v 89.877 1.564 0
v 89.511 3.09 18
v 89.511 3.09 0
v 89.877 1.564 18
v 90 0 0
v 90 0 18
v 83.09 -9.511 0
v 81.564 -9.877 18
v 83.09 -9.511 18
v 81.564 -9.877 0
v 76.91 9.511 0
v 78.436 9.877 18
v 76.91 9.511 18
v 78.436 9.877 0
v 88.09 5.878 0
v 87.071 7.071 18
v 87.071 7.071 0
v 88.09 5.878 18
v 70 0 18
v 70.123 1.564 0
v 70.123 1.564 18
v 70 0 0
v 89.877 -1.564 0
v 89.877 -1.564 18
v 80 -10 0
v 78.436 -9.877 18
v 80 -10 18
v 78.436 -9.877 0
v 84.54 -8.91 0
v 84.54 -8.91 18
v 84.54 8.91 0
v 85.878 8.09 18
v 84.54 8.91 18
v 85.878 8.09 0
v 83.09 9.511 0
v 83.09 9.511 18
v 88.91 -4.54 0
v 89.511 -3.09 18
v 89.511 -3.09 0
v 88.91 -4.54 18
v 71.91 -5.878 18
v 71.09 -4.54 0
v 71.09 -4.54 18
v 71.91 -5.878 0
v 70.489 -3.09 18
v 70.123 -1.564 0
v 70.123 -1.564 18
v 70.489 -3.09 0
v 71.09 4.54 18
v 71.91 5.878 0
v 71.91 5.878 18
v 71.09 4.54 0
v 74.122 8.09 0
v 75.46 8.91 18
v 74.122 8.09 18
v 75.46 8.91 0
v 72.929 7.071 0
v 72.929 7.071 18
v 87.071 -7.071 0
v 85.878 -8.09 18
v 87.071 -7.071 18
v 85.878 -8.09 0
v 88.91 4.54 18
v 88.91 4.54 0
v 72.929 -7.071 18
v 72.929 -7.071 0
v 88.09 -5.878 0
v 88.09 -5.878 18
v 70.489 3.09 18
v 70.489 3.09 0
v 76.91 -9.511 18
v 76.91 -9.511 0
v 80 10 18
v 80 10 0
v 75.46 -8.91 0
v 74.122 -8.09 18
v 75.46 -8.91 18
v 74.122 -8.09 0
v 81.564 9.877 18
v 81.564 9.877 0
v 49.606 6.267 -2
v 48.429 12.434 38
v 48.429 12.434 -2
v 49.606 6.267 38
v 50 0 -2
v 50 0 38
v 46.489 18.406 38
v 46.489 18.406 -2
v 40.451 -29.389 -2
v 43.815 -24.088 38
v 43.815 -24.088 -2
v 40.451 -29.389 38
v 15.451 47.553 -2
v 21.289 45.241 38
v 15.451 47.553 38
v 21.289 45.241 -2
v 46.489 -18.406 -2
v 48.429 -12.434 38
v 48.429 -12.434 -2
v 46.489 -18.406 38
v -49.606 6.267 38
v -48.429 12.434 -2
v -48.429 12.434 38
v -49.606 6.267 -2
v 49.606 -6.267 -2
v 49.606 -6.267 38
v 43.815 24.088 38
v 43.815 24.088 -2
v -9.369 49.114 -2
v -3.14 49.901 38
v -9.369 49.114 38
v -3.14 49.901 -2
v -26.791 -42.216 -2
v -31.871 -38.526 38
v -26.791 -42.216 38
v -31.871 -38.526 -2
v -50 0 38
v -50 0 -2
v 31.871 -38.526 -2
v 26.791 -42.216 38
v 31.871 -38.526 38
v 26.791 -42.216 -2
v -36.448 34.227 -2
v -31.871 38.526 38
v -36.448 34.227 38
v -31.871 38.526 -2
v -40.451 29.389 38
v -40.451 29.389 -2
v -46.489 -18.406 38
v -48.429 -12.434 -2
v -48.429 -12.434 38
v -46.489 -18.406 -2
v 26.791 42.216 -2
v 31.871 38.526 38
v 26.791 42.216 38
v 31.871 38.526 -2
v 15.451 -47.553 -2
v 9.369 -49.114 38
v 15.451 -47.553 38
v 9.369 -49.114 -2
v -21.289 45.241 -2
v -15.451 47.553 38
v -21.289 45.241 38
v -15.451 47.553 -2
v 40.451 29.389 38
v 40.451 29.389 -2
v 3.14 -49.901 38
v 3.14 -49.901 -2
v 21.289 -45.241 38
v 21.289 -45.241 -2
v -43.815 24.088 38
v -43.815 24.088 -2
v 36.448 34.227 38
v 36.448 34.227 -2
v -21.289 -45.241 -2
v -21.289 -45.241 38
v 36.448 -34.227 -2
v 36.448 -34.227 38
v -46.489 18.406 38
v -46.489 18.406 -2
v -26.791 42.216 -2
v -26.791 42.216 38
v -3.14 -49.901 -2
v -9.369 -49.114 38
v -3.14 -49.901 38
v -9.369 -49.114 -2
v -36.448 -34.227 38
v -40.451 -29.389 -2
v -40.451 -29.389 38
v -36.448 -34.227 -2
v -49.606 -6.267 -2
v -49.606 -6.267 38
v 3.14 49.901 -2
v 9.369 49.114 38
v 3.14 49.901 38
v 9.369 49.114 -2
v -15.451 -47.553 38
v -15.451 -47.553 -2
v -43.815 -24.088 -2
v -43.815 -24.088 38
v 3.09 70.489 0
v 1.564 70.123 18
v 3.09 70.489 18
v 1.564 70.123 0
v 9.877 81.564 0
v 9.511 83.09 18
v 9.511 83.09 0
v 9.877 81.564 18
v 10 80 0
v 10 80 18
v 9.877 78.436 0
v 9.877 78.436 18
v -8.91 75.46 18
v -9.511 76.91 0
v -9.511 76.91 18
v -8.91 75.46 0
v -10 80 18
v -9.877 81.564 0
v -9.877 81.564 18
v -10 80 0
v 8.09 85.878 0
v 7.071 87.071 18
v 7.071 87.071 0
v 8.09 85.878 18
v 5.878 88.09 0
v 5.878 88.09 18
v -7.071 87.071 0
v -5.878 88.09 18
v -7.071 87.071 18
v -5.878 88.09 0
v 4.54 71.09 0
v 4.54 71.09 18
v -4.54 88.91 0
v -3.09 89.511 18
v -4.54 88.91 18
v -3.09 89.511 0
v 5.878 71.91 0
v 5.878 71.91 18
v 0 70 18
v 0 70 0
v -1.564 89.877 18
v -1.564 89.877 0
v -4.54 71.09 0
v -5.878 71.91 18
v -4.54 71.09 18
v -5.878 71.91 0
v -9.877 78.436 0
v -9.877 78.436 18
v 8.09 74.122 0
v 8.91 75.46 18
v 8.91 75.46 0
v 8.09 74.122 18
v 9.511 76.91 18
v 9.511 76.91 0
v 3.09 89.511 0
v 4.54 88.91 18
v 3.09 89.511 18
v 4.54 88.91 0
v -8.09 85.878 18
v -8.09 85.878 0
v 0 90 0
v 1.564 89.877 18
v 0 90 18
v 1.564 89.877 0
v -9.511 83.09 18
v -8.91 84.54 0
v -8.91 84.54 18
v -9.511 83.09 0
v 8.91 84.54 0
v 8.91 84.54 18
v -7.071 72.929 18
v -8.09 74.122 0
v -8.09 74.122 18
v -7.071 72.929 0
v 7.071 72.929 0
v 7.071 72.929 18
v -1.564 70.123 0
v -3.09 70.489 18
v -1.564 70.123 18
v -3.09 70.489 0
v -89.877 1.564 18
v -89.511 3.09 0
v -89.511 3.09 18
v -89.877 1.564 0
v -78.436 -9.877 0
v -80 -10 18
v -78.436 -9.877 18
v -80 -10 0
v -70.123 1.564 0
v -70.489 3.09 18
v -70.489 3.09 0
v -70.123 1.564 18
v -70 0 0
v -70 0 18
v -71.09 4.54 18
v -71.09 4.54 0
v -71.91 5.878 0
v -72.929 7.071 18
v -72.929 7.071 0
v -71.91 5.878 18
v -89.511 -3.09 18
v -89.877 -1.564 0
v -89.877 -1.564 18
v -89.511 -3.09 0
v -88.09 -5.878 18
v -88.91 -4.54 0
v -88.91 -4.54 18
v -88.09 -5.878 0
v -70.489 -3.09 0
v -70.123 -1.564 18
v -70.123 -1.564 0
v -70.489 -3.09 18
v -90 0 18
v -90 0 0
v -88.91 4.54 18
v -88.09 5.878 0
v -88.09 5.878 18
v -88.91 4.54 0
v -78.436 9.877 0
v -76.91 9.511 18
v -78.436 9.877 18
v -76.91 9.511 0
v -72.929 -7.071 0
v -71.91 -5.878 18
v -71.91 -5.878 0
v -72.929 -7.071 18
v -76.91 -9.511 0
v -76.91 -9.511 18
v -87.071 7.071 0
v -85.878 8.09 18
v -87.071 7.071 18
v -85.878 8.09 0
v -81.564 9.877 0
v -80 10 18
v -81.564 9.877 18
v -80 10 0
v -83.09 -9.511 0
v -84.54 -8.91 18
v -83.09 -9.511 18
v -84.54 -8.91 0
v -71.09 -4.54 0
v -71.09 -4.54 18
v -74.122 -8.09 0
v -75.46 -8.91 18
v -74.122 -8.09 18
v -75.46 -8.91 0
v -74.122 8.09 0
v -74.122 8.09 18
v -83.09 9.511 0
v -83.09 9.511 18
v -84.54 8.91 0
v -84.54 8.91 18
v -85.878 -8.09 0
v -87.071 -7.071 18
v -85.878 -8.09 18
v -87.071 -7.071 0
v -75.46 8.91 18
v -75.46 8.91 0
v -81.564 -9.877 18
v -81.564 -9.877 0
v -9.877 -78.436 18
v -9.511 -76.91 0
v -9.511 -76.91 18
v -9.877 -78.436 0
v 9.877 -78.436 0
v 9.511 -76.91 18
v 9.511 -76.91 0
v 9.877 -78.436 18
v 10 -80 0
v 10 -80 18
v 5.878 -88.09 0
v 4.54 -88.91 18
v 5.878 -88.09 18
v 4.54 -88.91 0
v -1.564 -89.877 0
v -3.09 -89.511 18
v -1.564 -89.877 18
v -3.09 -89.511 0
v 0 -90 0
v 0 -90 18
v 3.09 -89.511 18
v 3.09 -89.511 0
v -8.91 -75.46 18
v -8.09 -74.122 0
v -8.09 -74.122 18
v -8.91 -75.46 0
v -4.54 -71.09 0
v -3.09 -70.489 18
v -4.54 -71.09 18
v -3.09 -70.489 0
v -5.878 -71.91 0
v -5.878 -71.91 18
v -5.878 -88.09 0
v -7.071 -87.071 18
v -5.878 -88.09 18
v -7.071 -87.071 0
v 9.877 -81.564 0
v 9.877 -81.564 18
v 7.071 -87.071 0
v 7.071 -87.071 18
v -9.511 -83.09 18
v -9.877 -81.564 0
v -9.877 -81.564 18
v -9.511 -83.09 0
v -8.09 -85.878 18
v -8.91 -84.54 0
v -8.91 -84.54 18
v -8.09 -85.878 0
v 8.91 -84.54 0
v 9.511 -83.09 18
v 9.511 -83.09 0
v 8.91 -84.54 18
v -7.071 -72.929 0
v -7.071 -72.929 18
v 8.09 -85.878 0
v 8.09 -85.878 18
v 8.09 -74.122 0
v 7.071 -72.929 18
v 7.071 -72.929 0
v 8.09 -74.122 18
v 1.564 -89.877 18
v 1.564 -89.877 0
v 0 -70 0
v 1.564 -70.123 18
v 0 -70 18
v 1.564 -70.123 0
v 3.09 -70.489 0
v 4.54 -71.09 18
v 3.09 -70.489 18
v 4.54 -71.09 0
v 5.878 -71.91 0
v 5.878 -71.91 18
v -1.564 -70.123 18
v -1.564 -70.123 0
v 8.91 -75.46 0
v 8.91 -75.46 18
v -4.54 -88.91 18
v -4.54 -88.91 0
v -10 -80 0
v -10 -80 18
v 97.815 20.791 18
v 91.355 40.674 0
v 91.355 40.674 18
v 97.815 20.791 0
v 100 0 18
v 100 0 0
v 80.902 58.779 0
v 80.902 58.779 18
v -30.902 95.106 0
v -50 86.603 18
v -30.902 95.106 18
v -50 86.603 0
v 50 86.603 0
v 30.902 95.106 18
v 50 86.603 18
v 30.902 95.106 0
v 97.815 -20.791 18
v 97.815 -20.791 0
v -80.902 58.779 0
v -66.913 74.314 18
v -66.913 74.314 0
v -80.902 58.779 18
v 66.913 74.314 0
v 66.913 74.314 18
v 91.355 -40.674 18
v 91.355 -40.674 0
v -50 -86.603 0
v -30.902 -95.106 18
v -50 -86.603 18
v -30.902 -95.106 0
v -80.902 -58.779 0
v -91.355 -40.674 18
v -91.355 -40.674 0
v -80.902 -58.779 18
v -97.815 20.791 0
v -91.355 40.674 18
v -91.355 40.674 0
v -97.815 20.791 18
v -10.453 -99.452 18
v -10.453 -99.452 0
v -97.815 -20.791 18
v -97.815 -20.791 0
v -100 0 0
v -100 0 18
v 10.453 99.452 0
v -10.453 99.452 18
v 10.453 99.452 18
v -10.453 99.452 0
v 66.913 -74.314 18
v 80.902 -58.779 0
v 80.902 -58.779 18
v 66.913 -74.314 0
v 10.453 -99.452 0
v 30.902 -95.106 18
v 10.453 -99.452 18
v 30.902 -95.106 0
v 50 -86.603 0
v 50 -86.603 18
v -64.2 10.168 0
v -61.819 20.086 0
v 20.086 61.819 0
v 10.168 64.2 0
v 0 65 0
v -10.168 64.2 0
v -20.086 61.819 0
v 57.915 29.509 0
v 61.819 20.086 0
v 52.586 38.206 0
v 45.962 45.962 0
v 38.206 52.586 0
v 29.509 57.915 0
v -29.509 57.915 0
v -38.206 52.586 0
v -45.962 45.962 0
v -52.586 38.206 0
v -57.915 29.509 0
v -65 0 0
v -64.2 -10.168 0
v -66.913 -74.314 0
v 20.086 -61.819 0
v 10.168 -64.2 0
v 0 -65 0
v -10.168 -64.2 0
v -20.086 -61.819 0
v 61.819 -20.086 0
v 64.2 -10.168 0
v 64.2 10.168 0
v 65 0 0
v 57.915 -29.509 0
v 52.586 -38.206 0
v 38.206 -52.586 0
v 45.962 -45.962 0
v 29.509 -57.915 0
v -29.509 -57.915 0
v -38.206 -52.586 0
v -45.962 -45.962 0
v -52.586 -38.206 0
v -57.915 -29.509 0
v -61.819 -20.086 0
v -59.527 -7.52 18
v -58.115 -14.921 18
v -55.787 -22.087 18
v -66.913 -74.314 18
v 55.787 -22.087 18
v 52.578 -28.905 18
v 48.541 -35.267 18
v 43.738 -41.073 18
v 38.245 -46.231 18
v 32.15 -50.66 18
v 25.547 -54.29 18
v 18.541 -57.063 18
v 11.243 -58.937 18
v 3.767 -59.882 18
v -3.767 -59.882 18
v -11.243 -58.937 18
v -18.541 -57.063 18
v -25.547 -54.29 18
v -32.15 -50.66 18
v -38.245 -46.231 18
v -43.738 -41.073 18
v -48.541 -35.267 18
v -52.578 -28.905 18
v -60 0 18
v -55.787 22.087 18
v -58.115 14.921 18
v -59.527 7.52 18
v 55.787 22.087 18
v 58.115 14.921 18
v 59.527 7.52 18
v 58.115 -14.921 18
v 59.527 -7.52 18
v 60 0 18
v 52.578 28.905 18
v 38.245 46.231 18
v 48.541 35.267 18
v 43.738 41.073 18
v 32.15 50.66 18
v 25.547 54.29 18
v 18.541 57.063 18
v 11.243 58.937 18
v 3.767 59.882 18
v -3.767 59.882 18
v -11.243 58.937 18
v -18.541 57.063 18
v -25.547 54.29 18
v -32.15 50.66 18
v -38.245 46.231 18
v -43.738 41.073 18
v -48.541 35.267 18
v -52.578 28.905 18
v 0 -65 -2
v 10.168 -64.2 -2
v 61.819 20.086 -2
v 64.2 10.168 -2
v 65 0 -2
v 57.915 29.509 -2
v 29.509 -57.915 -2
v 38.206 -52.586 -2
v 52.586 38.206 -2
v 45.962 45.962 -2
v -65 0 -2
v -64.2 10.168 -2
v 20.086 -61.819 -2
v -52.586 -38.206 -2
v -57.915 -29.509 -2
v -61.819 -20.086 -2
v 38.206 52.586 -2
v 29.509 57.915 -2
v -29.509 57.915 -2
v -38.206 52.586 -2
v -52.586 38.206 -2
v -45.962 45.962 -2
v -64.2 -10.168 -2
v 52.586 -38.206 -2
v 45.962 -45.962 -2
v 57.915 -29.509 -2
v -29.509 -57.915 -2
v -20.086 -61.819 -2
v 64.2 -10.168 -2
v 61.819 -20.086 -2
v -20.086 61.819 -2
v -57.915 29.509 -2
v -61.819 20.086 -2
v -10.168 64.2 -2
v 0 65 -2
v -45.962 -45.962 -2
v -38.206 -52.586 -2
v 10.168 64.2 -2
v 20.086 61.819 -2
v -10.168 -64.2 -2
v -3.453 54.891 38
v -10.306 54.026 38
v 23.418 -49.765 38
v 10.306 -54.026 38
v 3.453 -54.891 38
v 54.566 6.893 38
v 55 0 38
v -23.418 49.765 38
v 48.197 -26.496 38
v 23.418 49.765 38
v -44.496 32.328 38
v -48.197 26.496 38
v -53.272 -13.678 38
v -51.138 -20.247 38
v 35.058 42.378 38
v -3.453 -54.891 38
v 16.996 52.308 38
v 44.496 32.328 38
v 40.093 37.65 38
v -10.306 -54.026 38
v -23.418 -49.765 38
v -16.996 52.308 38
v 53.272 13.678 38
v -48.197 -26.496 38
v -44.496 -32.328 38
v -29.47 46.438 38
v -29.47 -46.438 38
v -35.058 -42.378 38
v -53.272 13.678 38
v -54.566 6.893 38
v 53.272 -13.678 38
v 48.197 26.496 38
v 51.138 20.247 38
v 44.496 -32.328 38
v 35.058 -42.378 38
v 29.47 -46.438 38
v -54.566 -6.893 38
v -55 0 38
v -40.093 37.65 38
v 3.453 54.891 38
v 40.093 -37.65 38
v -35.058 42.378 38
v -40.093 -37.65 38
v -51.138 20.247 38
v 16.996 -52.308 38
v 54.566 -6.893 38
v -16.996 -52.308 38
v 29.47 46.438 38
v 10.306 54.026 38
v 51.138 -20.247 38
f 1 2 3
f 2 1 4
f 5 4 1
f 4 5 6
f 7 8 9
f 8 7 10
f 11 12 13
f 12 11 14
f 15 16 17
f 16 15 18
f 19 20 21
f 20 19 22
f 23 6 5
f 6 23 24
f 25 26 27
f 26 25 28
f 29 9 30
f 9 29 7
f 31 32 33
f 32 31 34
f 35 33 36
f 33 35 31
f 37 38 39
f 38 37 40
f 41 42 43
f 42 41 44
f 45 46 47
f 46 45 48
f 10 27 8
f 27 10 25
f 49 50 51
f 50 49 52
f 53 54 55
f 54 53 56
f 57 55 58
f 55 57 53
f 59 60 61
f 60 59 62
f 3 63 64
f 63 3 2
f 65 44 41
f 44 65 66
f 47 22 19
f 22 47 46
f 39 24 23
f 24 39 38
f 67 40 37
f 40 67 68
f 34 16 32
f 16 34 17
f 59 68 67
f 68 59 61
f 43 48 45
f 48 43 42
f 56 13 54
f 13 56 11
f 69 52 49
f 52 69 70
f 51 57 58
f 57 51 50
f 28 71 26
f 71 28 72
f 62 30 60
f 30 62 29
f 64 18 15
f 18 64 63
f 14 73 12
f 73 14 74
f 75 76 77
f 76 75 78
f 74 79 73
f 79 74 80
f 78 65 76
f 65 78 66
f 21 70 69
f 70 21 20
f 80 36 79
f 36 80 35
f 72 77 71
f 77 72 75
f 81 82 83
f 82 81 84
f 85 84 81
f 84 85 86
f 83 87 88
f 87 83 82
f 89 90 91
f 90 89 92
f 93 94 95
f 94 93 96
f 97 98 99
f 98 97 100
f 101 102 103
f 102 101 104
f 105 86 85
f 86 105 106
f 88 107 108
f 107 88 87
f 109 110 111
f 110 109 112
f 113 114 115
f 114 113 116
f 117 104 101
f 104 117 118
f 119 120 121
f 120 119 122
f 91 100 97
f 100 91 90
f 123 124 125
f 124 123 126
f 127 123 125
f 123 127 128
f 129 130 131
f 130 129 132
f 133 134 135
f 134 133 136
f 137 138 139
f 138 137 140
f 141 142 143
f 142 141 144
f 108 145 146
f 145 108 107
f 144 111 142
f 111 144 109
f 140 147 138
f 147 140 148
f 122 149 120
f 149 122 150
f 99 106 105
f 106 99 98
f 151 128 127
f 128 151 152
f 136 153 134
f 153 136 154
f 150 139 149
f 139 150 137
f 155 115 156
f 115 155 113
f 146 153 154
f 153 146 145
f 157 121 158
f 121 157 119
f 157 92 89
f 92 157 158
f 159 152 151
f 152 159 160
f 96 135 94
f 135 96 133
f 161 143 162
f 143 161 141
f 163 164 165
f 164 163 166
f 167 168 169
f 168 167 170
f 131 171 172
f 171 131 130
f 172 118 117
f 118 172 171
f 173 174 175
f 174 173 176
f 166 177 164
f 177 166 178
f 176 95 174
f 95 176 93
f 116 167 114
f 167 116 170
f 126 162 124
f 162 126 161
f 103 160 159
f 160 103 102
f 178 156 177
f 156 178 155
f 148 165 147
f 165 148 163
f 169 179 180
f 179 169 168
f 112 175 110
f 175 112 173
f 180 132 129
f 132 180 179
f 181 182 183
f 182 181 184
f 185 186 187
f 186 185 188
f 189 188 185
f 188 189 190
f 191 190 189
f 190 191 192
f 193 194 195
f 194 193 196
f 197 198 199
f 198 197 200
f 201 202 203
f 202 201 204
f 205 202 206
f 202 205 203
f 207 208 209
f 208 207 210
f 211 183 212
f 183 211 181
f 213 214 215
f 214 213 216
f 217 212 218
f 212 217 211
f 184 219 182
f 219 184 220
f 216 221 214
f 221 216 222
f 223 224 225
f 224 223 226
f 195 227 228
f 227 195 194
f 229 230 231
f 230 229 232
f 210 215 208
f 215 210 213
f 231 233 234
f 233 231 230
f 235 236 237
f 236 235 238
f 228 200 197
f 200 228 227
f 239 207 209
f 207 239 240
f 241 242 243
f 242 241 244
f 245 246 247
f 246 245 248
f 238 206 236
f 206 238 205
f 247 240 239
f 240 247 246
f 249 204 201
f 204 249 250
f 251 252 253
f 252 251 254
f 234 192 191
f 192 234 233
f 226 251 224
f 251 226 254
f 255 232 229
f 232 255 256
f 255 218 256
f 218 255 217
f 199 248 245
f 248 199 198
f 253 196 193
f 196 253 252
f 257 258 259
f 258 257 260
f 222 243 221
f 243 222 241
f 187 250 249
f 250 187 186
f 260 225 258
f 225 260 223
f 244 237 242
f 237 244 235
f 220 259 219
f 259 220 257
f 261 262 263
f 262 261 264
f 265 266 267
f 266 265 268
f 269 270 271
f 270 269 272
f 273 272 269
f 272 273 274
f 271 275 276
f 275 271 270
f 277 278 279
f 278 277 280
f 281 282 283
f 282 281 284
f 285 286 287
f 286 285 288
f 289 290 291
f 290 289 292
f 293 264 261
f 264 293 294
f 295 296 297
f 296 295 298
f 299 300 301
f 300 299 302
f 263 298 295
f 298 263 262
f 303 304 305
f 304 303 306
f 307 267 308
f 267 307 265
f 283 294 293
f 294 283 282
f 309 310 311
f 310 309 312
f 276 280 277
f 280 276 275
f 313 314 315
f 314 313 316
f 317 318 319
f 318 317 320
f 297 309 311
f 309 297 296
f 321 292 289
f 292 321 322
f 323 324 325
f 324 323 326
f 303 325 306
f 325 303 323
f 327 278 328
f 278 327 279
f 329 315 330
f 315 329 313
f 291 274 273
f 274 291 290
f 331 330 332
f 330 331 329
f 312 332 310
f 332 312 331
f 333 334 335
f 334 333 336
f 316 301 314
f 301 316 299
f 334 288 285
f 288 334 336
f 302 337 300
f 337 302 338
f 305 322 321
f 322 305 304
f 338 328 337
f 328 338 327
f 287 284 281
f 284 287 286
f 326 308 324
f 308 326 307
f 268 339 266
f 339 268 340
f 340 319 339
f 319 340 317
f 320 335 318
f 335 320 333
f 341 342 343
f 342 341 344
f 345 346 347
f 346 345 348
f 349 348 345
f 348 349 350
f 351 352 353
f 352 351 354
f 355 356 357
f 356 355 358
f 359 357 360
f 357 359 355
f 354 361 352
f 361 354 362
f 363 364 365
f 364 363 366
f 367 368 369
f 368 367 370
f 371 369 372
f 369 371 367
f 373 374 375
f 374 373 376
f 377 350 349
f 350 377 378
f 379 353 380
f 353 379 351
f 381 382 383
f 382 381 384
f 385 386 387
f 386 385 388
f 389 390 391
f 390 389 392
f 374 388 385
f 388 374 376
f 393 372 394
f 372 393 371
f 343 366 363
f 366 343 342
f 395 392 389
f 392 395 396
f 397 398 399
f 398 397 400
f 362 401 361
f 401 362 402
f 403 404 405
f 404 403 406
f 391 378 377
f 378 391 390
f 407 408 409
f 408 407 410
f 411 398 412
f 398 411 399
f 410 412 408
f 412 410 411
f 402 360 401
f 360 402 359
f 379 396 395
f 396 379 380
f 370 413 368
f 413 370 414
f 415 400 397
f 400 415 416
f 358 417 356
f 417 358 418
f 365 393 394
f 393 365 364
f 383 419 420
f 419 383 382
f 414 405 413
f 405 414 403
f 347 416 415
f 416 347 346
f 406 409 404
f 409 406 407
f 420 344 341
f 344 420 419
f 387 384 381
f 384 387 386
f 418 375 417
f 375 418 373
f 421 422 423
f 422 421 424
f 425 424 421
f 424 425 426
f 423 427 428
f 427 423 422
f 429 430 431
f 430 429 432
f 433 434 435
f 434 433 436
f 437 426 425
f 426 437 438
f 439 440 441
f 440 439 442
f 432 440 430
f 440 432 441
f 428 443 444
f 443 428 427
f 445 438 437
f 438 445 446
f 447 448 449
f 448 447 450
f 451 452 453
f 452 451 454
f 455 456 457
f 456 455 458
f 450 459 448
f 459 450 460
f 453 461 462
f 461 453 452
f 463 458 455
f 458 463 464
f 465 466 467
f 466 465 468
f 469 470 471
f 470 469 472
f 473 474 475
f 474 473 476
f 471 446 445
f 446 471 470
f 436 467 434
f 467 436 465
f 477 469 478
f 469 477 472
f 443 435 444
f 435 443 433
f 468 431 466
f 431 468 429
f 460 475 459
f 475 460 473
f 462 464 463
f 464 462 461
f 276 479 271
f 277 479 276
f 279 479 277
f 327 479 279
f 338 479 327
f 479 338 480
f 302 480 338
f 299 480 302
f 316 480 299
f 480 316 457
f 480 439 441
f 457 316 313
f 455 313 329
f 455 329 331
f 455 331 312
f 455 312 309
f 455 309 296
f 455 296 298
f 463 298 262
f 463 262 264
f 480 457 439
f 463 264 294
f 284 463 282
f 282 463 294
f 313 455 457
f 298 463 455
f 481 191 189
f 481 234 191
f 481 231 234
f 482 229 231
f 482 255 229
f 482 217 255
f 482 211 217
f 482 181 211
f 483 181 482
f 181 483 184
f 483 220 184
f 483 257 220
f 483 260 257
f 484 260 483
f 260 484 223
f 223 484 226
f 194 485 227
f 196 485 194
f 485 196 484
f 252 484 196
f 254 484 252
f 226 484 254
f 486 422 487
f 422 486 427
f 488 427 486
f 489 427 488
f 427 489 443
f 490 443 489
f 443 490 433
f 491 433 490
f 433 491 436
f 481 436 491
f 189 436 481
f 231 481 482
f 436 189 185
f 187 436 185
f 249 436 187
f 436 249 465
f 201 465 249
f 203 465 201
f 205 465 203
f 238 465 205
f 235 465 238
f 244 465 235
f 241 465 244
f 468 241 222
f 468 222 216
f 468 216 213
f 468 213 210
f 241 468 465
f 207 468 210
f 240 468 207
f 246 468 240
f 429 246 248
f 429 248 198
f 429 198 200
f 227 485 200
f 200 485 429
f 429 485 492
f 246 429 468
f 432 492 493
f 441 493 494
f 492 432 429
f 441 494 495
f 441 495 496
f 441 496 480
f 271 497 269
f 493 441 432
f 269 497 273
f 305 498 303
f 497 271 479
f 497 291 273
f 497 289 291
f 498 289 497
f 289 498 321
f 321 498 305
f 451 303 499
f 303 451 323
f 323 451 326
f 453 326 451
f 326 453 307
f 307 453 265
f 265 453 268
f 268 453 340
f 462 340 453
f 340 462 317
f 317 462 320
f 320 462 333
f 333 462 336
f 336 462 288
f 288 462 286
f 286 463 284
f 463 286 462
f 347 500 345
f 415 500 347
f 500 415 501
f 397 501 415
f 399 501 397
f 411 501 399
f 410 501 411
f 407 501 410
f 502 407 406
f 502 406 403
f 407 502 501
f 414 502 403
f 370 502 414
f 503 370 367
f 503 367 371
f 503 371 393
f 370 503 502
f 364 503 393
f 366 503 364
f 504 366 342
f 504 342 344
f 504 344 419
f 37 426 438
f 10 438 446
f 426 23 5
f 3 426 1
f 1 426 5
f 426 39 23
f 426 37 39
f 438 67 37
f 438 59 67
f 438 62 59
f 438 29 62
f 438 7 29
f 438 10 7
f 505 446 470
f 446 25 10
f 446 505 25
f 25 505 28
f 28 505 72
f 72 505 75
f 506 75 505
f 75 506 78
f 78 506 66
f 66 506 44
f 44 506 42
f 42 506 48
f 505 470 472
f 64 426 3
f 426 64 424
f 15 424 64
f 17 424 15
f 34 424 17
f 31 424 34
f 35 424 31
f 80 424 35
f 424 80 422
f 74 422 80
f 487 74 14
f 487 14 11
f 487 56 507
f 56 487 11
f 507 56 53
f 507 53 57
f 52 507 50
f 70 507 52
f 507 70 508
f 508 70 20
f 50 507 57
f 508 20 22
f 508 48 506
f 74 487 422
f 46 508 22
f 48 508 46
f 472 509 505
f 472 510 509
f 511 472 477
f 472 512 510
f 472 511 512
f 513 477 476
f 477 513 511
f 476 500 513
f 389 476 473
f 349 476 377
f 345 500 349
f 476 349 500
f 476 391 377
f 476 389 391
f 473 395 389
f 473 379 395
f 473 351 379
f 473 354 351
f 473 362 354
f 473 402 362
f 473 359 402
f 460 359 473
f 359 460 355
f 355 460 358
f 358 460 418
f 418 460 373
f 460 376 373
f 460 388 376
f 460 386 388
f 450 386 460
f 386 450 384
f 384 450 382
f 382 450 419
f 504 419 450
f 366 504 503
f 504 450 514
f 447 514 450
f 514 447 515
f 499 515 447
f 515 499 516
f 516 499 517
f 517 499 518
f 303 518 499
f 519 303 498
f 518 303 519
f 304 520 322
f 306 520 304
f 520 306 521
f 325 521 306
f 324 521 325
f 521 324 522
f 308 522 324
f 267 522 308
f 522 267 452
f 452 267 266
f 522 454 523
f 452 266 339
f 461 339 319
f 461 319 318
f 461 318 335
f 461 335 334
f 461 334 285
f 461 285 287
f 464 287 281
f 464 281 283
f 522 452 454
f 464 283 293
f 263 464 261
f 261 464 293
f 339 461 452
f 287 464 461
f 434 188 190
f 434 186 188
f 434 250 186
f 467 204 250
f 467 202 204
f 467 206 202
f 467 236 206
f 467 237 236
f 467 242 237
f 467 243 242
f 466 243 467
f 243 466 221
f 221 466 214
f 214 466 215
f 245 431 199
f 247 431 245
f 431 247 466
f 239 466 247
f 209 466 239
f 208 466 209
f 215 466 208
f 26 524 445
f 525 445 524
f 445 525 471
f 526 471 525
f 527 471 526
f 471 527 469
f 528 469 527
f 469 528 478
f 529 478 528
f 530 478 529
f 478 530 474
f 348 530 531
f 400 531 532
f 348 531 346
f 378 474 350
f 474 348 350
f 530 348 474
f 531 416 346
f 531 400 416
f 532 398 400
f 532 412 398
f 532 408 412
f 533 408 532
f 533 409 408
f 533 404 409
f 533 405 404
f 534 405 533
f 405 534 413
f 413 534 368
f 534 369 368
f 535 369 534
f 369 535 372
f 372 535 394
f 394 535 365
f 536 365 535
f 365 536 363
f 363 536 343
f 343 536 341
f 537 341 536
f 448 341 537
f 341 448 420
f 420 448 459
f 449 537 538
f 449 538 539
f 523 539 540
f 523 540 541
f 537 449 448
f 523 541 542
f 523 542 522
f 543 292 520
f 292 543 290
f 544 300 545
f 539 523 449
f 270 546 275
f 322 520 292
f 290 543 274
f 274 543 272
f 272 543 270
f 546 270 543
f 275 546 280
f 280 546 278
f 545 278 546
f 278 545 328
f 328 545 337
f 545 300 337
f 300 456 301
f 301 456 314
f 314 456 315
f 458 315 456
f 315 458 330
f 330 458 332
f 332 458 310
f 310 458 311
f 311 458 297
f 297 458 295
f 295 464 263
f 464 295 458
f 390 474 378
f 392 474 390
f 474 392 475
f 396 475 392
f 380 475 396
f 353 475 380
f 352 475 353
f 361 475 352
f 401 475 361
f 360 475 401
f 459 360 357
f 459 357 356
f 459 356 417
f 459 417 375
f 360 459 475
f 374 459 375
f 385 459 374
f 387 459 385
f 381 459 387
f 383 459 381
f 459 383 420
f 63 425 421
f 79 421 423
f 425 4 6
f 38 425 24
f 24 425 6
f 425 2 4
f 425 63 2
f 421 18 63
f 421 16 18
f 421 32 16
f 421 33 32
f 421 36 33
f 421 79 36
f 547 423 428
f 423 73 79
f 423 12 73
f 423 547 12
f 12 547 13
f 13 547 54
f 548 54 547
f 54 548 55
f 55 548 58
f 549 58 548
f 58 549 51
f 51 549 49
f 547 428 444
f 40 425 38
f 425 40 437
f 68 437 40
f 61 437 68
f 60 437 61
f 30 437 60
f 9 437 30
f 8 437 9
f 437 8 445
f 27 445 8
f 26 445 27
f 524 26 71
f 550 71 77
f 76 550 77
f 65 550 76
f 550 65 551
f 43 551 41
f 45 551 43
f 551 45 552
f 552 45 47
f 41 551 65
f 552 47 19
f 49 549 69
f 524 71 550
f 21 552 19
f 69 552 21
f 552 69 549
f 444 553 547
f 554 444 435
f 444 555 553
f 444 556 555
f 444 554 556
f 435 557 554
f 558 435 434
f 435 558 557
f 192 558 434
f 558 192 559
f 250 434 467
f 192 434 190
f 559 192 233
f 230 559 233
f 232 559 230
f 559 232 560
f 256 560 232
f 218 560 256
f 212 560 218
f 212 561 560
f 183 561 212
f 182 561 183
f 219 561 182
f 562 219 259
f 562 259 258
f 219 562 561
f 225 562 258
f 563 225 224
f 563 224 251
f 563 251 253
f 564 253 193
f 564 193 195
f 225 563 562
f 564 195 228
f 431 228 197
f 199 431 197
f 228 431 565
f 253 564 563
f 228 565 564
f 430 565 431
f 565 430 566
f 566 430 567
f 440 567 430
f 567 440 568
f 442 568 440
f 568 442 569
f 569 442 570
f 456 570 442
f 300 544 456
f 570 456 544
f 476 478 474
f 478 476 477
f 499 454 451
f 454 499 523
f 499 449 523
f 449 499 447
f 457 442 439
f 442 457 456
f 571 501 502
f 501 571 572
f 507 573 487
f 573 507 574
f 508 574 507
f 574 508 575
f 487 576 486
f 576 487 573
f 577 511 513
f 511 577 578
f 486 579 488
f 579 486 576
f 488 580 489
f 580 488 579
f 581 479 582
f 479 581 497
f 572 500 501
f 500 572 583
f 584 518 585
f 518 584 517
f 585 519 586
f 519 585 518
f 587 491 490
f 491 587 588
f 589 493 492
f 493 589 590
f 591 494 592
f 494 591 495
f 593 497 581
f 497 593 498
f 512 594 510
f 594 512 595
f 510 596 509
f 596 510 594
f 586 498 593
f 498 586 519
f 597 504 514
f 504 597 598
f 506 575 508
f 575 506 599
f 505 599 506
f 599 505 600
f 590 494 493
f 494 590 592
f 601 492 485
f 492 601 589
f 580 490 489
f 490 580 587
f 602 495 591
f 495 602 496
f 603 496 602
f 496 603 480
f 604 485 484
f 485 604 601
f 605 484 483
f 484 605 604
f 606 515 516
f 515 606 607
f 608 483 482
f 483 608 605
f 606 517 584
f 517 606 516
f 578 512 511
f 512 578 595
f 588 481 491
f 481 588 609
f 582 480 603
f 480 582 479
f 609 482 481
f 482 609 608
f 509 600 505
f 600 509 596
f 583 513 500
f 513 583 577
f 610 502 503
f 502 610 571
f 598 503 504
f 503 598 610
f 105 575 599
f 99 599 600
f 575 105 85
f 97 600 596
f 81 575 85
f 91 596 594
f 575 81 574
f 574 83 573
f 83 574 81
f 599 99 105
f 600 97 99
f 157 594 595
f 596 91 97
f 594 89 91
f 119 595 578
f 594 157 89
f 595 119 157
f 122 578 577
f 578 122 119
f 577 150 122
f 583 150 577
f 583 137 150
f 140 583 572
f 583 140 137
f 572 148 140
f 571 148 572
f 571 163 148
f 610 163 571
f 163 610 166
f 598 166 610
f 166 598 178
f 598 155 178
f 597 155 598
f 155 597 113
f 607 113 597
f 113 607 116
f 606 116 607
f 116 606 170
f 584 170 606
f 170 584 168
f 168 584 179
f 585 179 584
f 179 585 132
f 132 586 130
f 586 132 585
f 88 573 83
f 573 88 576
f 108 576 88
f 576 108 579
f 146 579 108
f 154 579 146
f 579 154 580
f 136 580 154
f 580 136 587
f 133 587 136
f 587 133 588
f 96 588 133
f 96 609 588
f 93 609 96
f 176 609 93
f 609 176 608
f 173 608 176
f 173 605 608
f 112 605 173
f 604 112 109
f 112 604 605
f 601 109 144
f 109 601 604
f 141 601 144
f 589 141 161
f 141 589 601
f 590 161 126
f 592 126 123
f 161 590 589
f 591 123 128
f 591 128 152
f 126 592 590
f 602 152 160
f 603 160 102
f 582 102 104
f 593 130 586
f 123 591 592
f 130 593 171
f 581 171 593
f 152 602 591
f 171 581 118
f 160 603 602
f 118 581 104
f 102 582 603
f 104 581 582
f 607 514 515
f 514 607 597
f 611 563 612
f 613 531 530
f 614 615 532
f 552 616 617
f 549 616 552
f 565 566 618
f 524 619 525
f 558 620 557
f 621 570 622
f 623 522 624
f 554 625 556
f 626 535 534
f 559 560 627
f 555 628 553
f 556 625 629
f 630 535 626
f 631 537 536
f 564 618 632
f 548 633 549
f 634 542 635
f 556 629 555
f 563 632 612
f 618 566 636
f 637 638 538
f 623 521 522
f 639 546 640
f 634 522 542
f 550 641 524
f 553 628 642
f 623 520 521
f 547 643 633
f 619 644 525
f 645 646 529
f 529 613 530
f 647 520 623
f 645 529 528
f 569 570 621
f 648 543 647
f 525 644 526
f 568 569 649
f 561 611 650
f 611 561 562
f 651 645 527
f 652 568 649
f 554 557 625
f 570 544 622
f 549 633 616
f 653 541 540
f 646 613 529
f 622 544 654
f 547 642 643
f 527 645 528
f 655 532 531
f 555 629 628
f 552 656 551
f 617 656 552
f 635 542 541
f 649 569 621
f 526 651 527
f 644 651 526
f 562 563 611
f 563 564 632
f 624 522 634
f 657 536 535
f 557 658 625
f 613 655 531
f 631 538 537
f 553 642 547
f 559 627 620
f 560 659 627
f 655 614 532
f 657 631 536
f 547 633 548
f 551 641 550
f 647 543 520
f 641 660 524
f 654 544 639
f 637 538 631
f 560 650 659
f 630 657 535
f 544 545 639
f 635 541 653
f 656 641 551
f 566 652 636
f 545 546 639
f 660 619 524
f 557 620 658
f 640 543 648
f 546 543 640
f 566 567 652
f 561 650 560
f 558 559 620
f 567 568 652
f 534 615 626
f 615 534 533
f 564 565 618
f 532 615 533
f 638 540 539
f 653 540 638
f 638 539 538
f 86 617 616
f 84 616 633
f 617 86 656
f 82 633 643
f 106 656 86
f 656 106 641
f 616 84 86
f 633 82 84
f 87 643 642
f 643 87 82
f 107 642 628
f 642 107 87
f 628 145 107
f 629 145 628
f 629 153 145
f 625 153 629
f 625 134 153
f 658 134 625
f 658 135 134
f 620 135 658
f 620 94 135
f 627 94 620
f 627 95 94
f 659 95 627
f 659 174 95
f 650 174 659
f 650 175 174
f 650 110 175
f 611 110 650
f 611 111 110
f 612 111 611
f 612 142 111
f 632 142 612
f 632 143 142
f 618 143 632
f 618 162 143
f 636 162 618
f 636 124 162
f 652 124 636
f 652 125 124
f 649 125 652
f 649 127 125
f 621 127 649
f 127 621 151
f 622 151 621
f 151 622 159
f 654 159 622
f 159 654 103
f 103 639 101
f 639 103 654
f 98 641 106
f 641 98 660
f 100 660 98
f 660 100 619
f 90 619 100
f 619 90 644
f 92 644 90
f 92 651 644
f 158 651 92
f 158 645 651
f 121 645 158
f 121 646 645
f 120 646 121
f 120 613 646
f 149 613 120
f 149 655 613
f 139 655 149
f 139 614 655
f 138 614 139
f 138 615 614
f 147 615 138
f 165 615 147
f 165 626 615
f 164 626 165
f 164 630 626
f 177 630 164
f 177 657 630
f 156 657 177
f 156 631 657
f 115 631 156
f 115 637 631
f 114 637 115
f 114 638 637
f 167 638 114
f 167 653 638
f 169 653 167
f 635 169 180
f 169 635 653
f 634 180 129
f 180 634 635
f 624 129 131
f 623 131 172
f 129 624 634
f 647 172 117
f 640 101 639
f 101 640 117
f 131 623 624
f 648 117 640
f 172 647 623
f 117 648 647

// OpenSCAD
Flange_Height = 18;
Total_Height = 38;
Step_Height = 2;
Hole_Diameter = 10; 
Hole_Center_Distance = 100;

color("lime",1.0){
    difference(){

        union(){
            translate([0,0,- Step_Height]){ 
            cylinder(Step_Height,65,65,$fn=40);
            }

            difference(){
            cylinder(Flange_Height,100,100,$fn=30);
            
            r = 80;
            
            
            // Flange Holes
            for (i=[0:90:359]) {
                translate([r*cos(i),r*sin(i),-1])
                cylinder(Flange_Height+2,10,10,$fn=40);
             
                translate([0,0,-1]) 
                cylinder(12,50,50,$fn=50);  
                }
            }
        translate([0,0,Flange_Height]) 
        cylinder(Total_Height - Flange_Height,60,55,$fn=50);    
        }
     
       
        translate([0,0,-10]) 
        cylinder(100,50,50,$fn=50);
    }
}
